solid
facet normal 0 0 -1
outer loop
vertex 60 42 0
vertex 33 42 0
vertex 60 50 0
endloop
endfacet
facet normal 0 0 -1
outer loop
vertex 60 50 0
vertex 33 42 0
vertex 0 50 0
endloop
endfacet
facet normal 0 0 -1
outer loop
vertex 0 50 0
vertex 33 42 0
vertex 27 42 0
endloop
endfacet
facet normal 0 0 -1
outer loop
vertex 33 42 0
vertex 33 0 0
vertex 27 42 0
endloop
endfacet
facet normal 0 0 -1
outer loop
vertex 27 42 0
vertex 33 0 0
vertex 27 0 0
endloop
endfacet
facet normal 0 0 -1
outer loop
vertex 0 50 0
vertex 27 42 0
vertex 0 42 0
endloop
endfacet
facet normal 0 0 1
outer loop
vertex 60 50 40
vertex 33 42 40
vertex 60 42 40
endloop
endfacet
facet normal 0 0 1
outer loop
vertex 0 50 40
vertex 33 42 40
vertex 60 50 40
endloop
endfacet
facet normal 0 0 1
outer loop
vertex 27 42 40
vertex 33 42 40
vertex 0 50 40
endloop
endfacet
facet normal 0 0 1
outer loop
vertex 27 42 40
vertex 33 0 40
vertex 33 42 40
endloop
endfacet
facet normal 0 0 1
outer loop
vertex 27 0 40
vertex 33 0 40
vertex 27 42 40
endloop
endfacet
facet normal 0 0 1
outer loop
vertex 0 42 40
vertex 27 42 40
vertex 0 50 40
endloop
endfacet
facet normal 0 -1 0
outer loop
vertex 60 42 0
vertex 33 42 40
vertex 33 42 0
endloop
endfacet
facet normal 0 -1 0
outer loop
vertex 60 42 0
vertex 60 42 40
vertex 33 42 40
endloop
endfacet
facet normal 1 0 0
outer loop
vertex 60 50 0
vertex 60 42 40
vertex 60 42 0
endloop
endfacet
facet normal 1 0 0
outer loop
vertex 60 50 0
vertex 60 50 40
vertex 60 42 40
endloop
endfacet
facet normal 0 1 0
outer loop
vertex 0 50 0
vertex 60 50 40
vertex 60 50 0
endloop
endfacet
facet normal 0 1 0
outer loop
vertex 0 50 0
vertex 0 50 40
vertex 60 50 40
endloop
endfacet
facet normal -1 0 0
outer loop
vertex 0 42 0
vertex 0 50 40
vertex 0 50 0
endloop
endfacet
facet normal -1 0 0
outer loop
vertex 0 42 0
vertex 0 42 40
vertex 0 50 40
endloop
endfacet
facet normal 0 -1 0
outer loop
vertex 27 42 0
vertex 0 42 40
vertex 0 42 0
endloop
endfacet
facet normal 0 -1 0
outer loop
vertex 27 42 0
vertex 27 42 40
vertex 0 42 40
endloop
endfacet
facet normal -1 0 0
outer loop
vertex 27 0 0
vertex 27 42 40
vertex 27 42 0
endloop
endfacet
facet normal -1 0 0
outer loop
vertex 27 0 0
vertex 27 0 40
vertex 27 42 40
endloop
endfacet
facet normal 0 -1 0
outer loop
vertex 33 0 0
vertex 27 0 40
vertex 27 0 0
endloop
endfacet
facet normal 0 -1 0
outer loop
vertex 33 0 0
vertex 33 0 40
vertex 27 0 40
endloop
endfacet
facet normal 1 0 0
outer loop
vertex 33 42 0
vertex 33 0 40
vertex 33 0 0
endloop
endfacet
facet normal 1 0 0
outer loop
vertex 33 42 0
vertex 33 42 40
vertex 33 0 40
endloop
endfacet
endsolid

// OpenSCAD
$fn = 32;

// ----------------------------------------------------------------------
// Structural section: tee 60 x 50 mm
// ----------------------------------------------------------------------

// --- parameters (mm) ---
sec_w = 60;               // tee width, X
sec_h = 50;               // tee height, Y
flange_t = 8;             // top flange thickness
web_t = 6;                // web thickness
plate_t = 40;             // cut length, Z (extrusion height)

profile = [[27, 0], [33, 0], [33, 42], [60, 42], [60, 50], [0, 50], [0, 42], [27, 42]];  // primary outline, 8 points, counter clockwise

// --- the one profile operation ---
linear_extrude(height = plate_t) polygon(points = profile);
